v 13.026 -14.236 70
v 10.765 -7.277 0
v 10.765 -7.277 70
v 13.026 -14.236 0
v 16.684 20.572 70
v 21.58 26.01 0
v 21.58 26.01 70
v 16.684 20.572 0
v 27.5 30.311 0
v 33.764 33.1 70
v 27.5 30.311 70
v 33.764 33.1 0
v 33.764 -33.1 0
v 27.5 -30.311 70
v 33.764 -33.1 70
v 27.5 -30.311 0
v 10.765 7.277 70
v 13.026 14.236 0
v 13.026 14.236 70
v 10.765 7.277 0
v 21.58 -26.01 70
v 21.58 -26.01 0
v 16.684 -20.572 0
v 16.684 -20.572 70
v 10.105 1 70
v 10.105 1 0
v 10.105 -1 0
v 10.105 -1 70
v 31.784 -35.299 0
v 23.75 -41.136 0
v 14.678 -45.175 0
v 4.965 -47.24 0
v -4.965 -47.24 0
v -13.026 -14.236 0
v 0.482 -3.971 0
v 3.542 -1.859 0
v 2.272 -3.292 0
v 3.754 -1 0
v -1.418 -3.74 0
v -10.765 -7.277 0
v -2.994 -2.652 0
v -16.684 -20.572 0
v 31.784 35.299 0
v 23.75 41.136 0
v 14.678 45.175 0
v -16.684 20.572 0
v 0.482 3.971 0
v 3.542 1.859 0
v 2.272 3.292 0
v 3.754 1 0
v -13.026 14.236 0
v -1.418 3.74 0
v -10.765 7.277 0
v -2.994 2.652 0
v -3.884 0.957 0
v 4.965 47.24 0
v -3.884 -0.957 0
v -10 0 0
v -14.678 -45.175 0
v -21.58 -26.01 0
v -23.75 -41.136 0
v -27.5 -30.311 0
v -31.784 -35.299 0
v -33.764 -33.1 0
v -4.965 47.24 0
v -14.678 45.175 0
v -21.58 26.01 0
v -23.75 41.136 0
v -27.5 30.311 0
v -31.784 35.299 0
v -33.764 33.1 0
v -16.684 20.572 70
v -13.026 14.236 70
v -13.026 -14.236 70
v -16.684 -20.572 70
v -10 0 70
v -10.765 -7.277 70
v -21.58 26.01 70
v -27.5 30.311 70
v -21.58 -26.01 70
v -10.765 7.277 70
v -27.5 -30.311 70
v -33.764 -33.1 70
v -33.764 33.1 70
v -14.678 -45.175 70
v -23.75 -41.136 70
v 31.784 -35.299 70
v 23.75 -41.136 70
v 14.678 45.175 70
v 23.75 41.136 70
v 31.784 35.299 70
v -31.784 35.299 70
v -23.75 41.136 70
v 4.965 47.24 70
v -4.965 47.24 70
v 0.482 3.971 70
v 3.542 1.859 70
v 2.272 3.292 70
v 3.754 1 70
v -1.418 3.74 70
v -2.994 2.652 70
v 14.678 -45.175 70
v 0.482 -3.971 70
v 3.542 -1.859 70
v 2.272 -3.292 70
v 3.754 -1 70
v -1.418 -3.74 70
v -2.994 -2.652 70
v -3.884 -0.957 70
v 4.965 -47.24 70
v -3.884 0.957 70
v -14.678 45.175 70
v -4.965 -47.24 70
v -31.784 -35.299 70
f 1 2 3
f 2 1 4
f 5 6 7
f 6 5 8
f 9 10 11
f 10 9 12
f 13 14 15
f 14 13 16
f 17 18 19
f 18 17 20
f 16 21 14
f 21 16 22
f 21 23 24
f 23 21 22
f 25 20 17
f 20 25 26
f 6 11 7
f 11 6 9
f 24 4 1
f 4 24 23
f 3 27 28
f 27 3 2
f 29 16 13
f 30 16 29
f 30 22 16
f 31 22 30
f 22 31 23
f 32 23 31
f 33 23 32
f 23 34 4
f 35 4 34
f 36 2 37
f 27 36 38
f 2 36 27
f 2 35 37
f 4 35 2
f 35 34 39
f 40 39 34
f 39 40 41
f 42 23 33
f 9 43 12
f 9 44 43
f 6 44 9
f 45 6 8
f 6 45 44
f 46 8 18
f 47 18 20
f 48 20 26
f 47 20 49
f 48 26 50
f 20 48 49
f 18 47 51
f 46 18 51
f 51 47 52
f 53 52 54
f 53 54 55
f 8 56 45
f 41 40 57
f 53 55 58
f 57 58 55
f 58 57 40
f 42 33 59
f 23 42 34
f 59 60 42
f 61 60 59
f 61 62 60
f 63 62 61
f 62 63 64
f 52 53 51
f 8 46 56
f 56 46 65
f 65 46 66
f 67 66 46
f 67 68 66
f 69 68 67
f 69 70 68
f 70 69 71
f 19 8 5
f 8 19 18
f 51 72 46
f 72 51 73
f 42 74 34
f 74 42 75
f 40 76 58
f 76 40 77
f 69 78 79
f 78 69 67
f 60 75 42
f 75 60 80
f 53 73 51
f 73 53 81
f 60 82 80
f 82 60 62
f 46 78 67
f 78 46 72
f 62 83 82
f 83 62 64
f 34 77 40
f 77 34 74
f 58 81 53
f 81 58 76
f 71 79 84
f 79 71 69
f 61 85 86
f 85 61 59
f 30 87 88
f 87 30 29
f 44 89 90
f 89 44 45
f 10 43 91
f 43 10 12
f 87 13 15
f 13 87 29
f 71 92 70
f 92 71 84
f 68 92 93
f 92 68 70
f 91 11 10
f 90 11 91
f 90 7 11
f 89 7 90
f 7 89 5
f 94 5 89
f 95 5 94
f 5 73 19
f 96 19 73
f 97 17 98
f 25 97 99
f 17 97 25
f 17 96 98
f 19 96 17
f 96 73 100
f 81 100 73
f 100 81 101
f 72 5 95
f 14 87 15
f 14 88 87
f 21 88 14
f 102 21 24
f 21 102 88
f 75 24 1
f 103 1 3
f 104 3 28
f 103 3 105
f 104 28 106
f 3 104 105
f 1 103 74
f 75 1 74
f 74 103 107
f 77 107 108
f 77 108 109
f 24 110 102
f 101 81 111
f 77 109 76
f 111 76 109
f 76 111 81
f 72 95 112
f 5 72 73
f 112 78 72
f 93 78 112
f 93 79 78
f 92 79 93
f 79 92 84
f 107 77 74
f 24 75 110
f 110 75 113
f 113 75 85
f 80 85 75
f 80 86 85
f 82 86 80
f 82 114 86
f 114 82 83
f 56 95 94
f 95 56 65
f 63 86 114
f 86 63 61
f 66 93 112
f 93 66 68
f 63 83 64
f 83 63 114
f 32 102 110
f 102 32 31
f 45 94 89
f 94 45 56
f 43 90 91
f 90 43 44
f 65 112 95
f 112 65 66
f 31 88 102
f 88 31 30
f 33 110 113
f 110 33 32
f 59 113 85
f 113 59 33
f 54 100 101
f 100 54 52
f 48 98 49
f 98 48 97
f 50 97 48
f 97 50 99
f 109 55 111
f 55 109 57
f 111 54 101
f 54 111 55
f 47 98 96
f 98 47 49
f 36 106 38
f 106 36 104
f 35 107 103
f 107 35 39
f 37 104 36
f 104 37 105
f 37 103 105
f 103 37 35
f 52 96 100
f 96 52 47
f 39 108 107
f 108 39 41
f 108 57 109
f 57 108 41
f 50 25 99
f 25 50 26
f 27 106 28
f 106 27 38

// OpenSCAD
difference(){
   cylinder(d=95,h=70);
   cylinder(d=8,h=75);
   for(i = [0,180])
      rotate([0,0,i])
         translate([45,0,0])
            cylinder(d=70,h=75);
   translate([0,-1,0])
      cube([20,2,75]);
}
